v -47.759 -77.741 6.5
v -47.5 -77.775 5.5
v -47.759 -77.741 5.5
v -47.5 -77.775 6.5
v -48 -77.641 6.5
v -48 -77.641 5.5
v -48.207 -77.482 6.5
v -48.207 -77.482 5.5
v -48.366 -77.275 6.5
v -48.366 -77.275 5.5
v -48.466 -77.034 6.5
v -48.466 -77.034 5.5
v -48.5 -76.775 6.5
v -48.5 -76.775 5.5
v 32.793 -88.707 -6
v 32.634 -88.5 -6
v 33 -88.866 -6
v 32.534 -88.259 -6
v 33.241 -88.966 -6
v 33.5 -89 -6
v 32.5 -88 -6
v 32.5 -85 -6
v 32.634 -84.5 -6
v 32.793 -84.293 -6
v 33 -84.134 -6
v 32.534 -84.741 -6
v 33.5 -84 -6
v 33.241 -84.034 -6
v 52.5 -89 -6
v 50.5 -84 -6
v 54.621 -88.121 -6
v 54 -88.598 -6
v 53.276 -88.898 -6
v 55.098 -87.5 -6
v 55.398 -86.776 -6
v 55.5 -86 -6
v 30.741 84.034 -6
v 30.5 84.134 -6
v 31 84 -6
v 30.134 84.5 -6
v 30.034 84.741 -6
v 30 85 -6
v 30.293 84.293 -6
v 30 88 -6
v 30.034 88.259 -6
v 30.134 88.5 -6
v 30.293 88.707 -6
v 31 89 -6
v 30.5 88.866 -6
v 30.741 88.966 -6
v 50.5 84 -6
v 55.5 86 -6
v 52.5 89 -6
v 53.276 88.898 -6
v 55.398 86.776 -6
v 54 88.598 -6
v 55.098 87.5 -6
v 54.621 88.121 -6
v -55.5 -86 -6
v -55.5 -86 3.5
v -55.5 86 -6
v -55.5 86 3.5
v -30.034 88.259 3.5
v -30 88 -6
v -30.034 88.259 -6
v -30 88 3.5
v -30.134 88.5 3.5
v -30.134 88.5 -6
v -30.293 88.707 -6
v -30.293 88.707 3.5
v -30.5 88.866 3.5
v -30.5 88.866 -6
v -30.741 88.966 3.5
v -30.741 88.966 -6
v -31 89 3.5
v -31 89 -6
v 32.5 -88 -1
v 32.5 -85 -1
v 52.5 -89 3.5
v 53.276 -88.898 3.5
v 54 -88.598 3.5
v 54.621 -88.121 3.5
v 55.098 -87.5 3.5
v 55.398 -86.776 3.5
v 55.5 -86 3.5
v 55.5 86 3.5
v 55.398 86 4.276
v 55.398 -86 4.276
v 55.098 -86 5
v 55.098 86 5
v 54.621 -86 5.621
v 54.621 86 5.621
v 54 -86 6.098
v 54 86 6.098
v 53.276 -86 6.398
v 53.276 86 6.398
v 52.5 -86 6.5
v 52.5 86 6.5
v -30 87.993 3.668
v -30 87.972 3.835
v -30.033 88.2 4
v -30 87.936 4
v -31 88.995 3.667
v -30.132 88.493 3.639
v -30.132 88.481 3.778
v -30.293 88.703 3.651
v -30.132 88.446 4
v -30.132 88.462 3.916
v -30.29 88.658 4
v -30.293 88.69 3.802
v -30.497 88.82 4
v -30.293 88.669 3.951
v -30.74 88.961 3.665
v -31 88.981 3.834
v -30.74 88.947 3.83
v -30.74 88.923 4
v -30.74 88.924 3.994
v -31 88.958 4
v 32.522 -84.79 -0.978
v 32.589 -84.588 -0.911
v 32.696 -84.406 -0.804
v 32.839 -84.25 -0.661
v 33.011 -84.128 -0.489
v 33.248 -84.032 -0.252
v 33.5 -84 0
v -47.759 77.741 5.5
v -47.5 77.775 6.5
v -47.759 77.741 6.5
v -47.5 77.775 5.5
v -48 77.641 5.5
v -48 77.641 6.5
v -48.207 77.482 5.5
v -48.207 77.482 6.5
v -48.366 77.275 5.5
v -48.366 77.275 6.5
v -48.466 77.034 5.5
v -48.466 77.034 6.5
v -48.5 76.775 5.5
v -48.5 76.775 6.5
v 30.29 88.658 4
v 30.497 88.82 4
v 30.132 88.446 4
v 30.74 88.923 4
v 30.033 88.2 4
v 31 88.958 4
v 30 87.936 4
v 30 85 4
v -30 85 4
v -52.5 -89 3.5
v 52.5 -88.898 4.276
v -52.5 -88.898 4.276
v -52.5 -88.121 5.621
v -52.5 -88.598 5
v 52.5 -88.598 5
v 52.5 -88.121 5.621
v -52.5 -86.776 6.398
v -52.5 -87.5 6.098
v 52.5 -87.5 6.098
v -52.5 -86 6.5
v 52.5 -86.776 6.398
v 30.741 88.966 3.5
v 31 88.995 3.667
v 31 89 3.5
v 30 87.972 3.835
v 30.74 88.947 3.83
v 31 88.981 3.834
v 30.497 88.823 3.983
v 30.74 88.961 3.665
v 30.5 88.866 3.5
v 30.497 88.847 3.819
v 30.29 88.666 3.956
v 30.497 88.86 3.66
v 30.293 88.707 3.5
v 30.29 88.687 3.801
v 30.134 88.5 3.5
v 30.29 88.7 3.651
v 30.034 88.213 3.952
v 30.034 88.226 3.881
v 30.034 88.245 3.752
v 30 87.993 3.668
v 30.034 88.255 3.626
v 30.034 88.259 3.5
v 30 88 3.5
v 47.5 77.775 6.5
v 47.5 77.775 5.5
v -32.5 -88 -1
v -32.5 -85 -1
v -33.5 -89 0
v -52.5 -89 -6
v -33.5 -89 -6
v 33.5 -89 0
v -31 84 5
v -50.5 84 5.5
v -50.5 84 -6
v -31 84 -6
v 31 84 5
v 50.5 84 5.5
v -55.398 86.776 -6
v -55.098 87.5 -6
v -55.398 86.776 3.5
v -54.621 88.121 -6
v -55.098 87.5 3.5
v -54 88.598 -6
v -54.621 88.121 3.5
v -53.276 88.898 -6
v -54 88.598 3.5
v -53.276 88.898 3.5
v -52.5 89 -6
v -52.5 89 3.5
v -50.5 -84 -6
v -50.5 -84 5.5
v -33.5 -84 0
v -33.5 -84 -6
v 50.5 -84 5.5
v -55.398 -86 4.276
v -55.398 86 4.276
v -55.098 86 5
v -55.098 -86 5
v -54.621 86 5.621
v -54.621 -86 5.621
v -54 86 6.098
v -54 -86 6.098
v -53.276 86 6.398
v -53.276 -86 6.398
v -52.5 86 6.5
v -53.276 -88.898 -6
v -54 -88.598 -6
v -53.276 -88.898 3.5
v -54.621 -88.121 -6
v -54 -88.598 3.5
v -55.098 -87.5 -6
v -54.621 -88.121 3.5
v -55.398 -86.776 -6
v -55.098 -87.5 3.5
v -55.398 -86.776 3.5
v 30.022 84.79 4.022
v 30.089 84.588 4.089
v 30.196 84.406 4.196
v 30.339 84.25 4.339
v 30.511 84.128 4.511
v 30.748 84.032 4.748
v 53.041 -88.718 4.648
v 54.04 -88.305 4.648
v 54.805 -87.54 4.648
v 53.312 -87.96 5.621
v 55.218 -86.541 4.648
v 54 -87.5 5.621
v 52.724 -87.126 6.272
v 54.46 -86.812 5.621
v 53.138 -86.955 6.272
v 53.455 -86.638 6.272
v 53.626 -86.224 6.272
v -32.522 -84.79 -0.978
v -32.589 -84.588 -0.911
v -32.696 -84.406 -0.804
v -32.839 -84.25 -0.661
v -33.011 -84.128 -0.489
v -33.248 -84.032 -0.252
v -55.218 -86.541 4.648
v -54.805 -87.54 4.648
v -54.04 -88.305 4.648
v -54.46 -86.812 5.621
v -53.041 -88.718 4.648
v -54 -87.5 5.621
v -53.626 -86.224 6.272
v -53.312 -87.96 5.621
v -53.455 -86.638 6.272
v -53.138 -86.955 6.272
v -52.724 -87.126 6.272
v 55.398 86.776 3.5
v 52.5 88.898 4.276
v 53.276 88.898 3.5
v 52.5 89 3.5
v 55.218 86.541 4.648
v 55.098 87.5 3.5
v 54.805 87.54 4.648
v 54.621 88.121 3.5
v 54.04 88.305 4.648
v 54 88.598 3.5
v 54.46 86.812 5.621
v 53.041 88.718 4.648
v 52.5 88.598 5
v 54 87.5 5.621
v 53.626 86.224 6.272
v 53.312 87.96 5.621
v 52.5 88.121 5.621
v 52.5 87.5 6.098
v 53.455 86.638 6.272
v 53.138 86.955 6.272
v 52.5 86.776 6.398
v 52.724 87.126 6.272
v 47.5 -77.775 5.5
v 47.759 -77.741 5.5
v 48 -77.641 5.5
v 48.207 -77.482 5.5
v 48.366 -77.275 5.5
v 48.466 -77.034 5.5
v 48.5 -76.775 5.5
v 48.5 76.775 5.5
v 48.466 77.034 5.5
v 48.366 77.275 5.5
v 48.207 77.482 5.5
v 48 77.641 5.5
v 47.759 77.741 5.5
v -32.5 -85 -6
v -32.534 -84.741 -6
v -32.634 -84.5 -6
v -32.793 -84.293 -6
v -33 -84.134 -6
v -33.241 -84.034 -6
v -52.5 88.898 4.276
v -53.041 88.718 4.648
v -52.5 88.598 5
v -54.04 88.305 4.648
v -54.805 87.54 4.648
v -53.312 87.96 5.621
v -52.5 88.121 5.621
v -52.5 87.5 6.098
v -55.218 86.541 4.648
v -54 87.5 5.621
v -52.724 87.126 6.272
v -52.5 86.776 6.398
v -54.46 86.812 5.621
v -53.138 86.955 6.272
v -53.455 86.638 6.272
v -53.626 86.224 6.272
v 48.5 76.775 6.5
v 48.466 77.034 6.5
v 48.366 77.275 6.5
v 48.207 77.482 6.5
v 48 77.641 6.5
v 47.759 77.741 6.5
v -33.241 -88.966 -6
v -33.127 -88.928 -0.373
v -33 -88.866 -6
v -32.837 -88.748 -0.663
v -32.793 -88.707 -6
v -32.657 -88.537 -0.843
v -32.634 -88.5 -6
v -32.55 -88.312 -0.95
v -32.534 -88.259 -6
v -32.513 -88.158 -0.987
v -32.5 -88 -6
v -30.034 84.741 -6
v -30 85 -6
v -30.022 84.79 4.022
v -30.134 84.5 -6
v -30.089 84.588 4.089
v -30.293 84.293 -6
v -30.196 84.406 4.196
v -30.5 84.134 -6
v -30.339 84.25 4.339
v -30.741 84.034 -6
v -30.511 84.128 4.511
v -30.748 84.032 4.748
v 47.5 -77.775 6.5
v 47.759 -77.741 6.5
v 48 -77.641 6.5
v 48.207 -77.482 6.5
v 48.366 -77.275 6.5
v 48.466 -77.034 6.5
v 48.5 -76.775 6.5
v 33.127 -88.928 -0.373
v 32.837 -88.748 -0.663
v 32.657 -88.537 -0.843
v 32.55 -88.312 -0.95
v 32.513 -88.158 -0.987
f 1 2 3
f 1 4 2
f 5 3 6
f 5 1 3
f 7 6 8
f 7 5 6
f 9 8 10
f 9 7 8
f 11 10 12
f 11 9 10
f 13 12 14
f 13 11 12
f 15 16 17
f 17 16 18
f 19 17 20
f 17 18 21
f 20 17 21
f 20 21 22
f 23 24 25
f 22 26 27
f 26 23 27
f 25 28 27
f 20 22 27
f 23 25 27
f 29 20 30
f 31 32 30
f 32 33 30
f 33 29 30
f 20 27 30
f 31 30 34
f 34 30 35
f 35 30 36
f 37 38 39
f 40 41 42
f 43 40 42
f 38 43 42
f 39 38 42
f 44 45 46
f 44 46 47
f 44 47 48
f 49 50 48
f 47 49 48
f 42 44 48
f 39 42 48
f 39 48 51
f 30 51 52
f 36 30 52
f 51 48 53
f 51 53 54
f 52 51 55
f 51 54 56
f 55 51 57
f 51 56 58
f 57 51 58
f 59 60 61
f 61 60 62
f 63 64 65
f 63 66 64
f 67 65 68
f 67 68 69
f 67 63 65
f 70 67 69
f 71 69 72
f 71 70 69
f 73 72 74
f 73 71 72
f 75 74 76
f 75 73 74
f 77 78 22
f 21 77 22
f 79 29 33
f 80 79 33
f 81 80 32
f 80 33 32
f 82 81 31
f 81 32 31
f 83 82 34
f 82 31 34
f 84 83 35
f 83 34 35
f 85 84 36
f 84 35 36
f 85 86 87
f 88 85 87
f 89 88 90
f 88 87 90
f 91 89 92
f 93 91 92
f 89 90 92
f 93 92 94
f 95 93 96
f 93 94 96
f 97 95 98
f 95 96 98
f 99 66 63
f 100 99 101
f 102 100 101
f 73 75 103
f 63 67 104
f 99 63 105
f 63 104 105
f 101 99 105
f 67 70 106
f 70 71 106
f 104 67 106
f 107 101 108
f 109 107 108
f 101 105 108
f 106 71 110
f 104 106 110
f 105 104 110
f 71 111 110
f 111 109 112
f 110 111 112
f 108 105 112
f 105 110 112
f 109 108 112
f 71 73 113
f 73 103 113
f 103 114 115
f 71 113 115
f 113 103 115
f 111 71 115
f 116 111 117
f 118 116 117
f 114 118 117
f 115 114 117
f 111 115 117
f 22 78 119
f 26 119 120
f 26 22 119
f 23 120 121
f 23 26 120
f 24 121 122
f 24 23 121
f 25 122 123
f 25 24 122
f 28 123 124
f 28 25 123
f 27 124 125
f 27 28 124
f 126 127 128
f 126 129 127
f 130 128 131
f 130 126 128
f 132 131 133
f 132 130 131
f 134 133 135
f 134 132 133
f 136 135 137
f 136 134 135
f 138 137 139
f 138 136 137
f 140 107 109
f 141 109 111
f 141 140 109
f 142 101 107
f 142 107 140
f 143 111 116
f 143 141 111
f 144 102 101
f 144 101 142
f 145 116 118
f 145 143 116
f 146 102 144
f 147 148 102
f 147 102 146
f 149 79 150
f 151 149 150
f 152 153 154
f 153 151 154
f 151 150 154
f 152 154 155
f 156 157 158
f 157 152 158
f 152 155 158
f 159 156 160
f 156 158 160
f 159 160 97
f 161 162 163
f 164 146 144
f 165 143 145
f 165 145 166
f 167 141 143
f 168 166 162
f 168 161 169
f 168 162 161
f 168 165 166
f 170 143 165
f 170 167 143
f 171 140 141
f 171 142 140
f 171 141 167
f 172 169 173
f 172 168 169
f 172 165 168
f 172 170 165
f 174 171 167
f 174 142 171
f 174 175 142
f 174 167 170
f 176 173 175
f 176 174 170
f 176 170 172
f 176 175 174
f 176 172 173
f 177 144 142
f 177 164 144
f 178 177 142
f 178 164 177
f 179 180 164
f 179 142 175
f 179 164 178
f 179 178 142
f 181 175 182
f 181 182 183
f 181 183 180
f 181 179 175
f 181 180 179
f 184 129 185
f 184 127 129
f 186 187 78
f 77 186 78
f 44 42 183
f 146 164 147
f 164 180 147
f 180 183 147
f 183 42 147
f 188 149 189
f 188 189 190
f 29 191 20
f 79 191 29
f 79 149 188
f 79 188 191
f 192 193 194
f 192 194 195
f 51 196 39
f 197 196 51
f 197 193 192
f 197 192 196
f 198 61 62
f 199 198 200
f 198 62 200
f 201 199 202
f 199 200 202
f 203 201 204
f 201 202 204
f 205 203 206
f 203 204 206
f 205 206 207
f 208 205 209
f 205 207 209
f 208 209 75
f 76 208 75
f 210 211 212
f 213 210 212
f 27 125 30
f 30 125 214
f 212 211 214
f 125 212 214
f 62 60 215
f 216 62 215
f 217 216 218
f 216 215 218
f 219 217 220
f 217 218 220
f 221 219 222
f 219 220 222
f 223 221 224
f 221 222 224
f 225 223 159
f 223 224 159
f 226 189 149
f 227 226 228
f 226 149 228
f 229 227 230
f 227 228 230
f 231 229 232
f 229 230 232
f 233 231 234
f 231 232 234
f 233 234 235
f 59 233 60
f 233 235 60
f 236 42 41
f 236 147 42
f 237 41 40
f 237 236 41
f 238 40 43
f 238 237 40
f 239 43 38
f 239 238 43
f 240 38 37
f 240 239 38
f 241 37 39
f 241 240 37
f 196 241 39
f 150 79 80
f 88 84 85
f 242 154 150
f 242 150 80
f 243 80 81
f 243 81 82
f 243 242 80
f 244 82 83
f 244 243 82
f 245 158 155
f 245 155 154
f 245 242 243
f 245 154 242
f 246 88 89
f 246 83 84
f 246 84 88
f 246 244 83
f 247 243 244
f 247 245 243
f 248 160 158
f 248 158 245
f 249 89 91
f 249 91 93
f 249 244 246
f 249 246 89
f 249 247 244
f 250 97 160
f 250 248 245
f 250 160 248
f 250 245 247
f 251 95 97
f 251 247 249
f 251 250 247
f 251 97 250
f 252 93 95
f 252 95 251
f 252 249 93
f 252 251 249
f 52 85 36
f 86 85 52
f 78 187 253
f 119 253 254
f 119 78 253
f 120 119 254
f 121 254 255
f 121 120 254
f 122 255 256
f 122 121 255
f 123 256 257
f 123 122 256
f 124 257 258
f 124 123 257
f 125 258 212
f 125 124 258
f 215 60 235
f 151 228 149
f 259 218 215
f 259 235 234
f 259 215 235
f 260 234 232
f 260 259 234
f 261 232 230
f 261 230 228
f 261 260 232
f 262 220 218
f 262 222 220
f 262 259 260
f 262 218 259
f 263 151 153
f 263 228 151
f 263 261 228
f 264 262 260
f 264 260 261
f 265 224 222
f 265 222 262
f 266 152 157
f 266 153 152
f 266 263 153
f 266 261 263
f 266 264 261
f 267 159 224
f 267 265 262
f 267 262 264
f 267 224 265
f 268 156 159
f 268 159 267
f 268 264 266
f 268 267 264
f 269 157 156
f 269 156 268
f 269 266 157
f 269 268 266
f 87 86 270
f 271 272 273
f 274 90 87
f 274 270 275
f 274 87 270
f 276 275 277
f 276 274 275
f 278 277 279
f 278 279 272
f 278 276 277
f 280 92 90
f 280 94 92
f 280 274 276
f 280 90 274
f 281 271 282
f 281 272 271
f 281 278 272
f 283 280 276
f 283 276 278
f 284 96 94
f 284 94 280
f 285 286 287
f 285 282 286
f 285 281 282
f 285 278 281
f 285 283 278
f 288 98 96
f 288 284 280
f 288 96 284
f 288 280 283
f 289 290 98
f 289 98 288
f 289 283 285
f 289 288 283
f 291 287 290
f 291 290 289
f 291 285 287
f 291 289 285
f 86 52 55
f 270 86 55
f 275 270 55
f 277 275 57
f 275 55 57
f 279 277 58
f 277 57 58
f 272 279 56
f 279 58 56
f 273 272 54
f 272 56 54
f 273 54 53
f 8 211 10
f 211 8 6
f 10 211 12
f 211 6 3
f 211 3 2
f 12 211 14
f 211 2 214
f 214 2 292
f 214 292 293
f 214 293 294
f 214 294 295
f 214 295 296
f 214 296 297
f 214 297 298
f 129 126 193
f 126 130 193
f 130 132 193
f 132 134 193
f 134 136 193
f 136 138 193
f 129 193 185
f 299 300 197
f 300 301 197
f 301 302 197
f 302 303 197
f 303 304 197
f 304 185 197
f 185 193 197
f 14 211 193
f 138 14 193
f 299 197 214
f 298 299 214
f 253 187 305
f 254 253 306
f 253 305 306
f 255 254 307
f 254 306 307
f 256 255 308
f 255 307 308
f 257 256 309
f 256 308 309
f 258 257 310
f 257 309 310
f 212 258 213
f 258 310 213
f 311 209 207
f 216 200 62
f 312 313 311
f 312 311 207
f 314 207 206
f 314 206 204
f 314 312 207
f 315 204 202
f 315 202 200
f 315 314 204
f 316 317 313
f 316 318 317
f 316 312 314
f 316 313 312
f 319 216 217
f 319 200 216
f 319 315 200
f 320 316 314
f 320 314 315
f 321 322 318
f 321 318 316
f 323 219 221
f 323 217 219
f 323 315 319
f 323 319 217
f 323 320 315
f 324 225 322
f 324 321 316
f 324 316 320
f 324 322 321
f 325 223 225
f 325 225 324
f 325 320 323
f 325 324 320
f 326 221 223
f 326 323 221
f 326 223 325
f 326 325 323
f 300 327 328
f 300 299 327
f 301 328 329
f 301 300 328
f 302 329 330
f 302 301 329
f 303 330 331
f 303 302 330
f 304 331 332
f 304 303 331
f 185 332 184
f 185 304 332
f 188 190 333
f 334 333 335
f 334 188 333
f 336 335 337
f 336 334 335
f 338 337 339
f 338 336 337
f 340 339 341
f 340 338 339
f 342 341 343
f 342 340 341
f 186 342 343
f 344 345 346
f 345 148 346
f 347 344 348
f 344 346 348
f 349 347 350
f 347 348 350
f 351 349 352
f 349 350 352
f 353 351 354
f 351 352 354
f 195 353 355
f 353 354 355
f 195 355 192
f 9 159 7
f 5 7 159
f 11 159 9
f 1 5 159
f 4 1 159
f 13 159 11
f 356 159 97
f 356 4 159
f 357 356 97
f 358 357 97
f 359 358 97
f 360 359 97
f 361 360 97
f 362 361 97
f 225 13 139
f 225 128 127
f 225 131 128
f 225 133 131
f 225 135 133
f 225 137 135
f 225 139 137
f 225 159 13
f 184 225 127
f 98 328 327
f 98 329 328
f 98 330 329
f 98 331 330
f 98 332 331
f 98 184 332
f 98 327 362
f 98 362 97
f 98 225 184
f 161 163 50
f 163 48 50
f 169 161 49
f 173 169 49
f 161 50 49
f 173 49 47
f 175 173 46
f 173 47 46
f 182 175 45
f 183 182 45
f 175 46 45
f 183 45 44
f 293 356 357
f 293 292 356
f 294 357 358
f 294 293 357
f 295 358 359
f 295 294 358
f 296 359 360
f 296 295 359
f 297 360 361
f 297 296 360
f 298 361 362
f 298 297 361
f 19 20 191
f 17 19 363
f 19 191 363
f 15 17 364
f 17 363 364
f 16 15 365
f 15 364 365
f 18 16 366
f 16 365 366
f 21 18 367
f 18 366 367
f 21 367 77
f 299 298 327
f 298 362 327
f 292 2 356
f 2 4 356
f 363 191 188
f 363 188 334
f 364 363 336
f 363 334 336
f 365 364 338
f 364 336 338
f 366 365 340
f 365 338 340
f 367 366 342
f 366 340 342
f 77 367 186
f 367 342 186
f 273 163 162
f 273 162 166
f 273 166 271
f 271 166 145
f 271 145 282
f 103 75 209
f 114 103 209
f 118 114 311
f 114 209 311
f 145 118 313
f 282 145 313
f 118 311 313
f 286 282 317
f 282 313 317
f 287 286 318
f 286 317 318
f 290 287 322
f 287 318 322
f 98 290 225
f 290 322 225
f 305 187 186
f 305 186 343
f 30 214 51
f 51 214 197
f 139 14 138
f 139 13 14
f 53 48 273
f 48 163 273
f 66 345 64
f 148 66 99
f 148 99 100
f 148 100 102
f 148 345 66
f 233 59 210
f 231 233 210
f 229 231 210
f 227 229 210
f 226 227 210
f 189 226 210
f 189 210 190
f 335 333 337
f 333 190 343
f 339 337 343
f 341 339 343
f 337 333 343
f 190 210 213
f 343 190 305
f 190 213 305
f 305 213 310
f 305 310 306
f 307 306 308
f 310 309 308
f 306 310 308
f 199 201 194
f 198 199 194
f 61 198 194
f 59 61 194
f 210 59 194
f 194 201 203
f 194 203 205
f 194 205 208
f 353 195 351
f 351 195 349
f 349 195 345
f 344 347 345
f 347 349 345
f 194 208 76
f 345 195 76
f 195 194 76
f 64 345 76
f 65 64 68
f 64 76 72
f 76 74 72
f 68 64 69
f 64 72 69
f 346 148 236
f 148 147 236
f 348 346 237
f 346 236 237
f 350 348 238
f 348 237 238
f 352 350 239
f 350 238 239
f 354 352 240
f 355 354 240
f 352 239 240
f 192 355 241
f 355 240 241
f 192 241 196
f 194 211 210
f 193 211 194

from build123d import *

# Parameters (mm, degrees)
SKETCH1_W           = 111
SKETCH1_H           = 178
SKETCH1_W_2         = 101
SKETCH1_H_2         = 168
BOSS_EXTRUDE1_DEPTH = 6
SKETCH2_W           = 111
SKETCH2_H           = 178
SKETCH2_W_2         = 97
SKETCH2_H_2         = 155.54954955
BOSS_EXTRUDE2_DEPTH = 0.5
SKETCH3_W           = 60
SKETCH3_H           = 10
CUT_EXTRUDE1_DEPTH  = 77
SKETCH4_W           = 65
SKETCH4_H           = 10
CUT_EXTRUDE2_DEPTH  = 77
FILLET1_R           = 1
FILLET2_R           = 3
FILLET3_R           = 1


with BuildPart() as part:
    # Sketch1 → Boss-Extrude1 (new, symmetric)
    with BuildSketch(Plane.XY):
        Rectangle(SKETCH1_W, SKETCH1_H)
        Rectangle(SKETCH1_W_2, SKETCH1_H_2, mode=Mode.SUBTRACT)
    extrude(amount=BOSS_EXTRUDE1_DEPTH, both=True)

    # Sketch2 → Boss-Extrude2 (add, symmetric)
    with BuildSketch(Plane.XY.offset(6)):
        Rectangle(SKETCH2_W, SKETCH2_H)
        Rectangle(SKETCH2_W_2, SKETCH2_H_2, mode=Mode.SUBTRACT)
    extrude(amount=BOSS_EXTRUDE2_DEPTH, both=True)

    # Sketch3 → Cut-Extrude1 (cut)
    with BuildSketch(Plane.XZ.offset(-84)):
        with Locations((0, -1)):
            Rectangle(SKETCH3_W, SKETCH3_H)
    extrude(amount=-CUT_EXTRUDE1_DEPTH, mode=Mode.SUBTRACT)

    # Sketch4 → Cut-Extrude2 (cut)
    with BuildSketch(Plane(origin=(0, -84, 0), x_dir=(1, 0, 0), z_dir=(0, 1, 0))):
        with Locations((0, 6)):
            Rectangle(SKETCH4_W, SKETCH4_H)
    extrude(amount=-CUT_EXTRUDE2_DEPTH, mode=Mode.SUBTRACT)

    # Fillet1
    fillet1_edges = [part.edges().sort_by_distance(p)[0] for p in [
        (-48.5, -77.774774775, 6),
        (48.5, -77.774774775, 6),
        (48.5, 77.774774775, 6),
        (-48.5, 77.774774775, 6),
    ]]
    fillet(fillet1_edges, radius=FILLET1_R)

    # Fillet2
    # the kernel refuses this fillet: 3 mm, written as the material it takes off along each edge
    with BuildSketch(Plane(origin=(-52.5, -86, 3.5), x_dir=(0, -1, 0), z_dir=(0, 0, 1))) as fillet2_piece_1_section:
        Polygon((0, 0), (FILLET2_R, 0), (FILLET2_R, -FILLET2_R), (0, -FILLET2_R), align=None)
    fillet2_piece_1 = extrude(amount=FILLET2_R, mode=Mode.PRIVATE)
    fillet2_piece_1 = fillet2_piece_1 - Plane(origin=(-52.5, -86, 3.5), x_dir=(0.7071067811865475, 0.7071067811865477, 0), z_dir=(0, 0, 1)) * Sphere(FILLET2_R, mode=Mode.PRIVATE)
    add(fillet2_piece_1, mode=Mode.SUBTRACT)
    with BuildSketch(Plane(origin=(-52.5, 86, 3.5), x_dir=(-1, 0, 0), z_dir=(0, 0, 1))) as fillet2_piece_2_section:
        Polygon((0, 0), (FILLET2_R, 0), (FILLET2_R, -FILLET2_R), (0, -FILLET2_R), align=None)
    fillet2_piece_2 = extrude(amount=FILLET2_R, mode=Mode.PRIVATE)
    fillet2_piece_2 = fillet2_piece_2 - Plane(origin=(-52.5, 86, 3.5), x_dir=(0.7071067811865477, -0.7071067811865474, 0), z_dir=(0, 0, 1)) * Sphere(FILLET2_R, mode=Mode.PRIVATE)
    add(fillet2_piece_2, mode=Mode.SUBTRACT)
    with BuildSketch(Plane(origin=(52.5, -86, 3.5), x_dir=(0, -1, 0), z_dir=(0, 0, 1))) as fillet2_piece_3_section:
        Polygon((0, 0), (FILLET2_R, 0), (FILLET2_R, FILLET2_R), (0, FILLET2_R), align=None)
    fillet2_piece_3 = extrude(amount=FILLET2_R, mode=Mode.PRIVATE)
    fillet2_piece_3 = fillet2_piece_3 - Plane(origin=(52.5, -86, 3.5), x_dir=(-0.7071067811865476, 0.7071067811865475, 0), z_dir=(0, 0, 1)) * Sphere(FILLET2_R, mode=Mode.PRIVATE)
    add(fillet2_piece_3, mode=Mode.SUBTRACT)
    with BuildSketch(Plane(origin=(52.5, 86, 3.5), x_dir=(0, 1, 0), z_dir=(0, 0, 1))) as fillet2_piece_4_section:
        Polygon((0, 0), (FILLET2_R, 0), (FILLET2_R, -FILLET2_R), (0, -FILLET2_R), align=None)
    fillet2_piece_4 = extrude(amount=FILLET2_R, mode=Mode.PRIVATE)
    fillet2_piece_4 = fillet2_piece_4 - Plane(origin=(52.5, 86, 3.5), x_dir=(-0.7071067811865474, -0.7071067811865477, 0), z_dir=(0, 0, 1)) * Sphere(FILLET2_R, mode=Mode.PRIVATE)
    add(fillet2_piece_4, mode=Mode.SUBTRACT)
    with BuildSketch(Plane(origin=(-55.5, -86, 6.5), x_dir=(1, 0, 0), z_dir=(0, 1, 0)), Plane(origin=(55.5, 86, 6.5), x_dir=(-1, 0, 0), z_dir=(0, -1, 0))) as fillet2_piece_5:
        with BuildLine():
            CenterArc((FILLET2_R, FILLET2_R), FILLET2_R, 180, 90)
            Line((0, FILLET2_R), (0, 0))
            Line((0, 0), (FILLET2_R, 0))
        make_face()
    extrude(amount=172, mode=Mode.SUBTRACT)
    with BuildSketch(Plane(origin=(52.5, -89, 6.5), x_dir=(0, 1, 0), z_dir=(-1, 0, 0)), Plane(origin=(-52.5, 89, 6.5), x_dir=(0, -1, 0), z_dir=(1, 0, 0))) as fillet2_piece_6:
        with BuildLine():
            CenterArc((FILLET2_R, FILLET2_R), FILLET2_R, 180, 90)
            Line((0, FILLET2_R), (0, 0))
            Line((0, 0), (FILLET2_R, 0))
        make_face()
    extrude(amount=105, mode=Mode.SUBTRACT)
    with BuildSketch(Plane(origin=(55.5, 89, -13.5), x_dir=(-1, 0, 0), z_dir=(0, 0, 1))) as fillet2_piece_7:
        with BuildLine():
            CenterArc((FILLET2_R, FILLET2_R), FILLET2_R, 180, 90)
            Line((0, FILLET2_R), (0, 0))
            Line((0, 0), (FILLET2_R, 0))
        make_face()
    extrude(amount=17, mode=Mode.SUBTRACT)
    with BuildSketch(Plane(origin=(-55.5, 89, 3.5), x_dir=(0, -1, 0), z_dir=(0, 0, -1)), Plane(origin=(55.5, -89, -13.5), x_dir=(-1, 0, 0), z_dir=(0, 0, 1)), Plane(origin=(-55.5, -89, 3.5), x_dir=(1, 0, 0), z_dir=(0, 0, -1))) as fillet2_piece_8:
        with BuildLine():
            CenterArc((FILLET2_R, -FILLET2_R), FILLET2_R, 90, 90)
            Line((0, -FILLET2_R), (0, 0))
            Line((0, 0), (FILLET2_R, 0))
        make_face()
    extrude(amount=17, mode=Mode.SUBTRACT)

    # Fillet3
    fillet3_edges = [part.edges().sort_by_distance(p)[0] for p in [
        (-30, 89, -1.25),
        (-30, 88.989491568, 3.750878781),
        (30, 88.989491568, 3.750878781),
        (30, 89, -1.25),
        (-30, 84, -1),
        (30, 84, -1),
        (0, 84, 4),
        (0, -89, -1),
        (32.5, -89, -3.5),
        (-32.5, -89, -3.5),
        (32.5, -84, -3.5),
        (-32.5, -84, -3.5),
        (0, -84, -1),
    ]]
    fillet(fillet3_edges, radius=FILLET3_R)


solid = part.part
